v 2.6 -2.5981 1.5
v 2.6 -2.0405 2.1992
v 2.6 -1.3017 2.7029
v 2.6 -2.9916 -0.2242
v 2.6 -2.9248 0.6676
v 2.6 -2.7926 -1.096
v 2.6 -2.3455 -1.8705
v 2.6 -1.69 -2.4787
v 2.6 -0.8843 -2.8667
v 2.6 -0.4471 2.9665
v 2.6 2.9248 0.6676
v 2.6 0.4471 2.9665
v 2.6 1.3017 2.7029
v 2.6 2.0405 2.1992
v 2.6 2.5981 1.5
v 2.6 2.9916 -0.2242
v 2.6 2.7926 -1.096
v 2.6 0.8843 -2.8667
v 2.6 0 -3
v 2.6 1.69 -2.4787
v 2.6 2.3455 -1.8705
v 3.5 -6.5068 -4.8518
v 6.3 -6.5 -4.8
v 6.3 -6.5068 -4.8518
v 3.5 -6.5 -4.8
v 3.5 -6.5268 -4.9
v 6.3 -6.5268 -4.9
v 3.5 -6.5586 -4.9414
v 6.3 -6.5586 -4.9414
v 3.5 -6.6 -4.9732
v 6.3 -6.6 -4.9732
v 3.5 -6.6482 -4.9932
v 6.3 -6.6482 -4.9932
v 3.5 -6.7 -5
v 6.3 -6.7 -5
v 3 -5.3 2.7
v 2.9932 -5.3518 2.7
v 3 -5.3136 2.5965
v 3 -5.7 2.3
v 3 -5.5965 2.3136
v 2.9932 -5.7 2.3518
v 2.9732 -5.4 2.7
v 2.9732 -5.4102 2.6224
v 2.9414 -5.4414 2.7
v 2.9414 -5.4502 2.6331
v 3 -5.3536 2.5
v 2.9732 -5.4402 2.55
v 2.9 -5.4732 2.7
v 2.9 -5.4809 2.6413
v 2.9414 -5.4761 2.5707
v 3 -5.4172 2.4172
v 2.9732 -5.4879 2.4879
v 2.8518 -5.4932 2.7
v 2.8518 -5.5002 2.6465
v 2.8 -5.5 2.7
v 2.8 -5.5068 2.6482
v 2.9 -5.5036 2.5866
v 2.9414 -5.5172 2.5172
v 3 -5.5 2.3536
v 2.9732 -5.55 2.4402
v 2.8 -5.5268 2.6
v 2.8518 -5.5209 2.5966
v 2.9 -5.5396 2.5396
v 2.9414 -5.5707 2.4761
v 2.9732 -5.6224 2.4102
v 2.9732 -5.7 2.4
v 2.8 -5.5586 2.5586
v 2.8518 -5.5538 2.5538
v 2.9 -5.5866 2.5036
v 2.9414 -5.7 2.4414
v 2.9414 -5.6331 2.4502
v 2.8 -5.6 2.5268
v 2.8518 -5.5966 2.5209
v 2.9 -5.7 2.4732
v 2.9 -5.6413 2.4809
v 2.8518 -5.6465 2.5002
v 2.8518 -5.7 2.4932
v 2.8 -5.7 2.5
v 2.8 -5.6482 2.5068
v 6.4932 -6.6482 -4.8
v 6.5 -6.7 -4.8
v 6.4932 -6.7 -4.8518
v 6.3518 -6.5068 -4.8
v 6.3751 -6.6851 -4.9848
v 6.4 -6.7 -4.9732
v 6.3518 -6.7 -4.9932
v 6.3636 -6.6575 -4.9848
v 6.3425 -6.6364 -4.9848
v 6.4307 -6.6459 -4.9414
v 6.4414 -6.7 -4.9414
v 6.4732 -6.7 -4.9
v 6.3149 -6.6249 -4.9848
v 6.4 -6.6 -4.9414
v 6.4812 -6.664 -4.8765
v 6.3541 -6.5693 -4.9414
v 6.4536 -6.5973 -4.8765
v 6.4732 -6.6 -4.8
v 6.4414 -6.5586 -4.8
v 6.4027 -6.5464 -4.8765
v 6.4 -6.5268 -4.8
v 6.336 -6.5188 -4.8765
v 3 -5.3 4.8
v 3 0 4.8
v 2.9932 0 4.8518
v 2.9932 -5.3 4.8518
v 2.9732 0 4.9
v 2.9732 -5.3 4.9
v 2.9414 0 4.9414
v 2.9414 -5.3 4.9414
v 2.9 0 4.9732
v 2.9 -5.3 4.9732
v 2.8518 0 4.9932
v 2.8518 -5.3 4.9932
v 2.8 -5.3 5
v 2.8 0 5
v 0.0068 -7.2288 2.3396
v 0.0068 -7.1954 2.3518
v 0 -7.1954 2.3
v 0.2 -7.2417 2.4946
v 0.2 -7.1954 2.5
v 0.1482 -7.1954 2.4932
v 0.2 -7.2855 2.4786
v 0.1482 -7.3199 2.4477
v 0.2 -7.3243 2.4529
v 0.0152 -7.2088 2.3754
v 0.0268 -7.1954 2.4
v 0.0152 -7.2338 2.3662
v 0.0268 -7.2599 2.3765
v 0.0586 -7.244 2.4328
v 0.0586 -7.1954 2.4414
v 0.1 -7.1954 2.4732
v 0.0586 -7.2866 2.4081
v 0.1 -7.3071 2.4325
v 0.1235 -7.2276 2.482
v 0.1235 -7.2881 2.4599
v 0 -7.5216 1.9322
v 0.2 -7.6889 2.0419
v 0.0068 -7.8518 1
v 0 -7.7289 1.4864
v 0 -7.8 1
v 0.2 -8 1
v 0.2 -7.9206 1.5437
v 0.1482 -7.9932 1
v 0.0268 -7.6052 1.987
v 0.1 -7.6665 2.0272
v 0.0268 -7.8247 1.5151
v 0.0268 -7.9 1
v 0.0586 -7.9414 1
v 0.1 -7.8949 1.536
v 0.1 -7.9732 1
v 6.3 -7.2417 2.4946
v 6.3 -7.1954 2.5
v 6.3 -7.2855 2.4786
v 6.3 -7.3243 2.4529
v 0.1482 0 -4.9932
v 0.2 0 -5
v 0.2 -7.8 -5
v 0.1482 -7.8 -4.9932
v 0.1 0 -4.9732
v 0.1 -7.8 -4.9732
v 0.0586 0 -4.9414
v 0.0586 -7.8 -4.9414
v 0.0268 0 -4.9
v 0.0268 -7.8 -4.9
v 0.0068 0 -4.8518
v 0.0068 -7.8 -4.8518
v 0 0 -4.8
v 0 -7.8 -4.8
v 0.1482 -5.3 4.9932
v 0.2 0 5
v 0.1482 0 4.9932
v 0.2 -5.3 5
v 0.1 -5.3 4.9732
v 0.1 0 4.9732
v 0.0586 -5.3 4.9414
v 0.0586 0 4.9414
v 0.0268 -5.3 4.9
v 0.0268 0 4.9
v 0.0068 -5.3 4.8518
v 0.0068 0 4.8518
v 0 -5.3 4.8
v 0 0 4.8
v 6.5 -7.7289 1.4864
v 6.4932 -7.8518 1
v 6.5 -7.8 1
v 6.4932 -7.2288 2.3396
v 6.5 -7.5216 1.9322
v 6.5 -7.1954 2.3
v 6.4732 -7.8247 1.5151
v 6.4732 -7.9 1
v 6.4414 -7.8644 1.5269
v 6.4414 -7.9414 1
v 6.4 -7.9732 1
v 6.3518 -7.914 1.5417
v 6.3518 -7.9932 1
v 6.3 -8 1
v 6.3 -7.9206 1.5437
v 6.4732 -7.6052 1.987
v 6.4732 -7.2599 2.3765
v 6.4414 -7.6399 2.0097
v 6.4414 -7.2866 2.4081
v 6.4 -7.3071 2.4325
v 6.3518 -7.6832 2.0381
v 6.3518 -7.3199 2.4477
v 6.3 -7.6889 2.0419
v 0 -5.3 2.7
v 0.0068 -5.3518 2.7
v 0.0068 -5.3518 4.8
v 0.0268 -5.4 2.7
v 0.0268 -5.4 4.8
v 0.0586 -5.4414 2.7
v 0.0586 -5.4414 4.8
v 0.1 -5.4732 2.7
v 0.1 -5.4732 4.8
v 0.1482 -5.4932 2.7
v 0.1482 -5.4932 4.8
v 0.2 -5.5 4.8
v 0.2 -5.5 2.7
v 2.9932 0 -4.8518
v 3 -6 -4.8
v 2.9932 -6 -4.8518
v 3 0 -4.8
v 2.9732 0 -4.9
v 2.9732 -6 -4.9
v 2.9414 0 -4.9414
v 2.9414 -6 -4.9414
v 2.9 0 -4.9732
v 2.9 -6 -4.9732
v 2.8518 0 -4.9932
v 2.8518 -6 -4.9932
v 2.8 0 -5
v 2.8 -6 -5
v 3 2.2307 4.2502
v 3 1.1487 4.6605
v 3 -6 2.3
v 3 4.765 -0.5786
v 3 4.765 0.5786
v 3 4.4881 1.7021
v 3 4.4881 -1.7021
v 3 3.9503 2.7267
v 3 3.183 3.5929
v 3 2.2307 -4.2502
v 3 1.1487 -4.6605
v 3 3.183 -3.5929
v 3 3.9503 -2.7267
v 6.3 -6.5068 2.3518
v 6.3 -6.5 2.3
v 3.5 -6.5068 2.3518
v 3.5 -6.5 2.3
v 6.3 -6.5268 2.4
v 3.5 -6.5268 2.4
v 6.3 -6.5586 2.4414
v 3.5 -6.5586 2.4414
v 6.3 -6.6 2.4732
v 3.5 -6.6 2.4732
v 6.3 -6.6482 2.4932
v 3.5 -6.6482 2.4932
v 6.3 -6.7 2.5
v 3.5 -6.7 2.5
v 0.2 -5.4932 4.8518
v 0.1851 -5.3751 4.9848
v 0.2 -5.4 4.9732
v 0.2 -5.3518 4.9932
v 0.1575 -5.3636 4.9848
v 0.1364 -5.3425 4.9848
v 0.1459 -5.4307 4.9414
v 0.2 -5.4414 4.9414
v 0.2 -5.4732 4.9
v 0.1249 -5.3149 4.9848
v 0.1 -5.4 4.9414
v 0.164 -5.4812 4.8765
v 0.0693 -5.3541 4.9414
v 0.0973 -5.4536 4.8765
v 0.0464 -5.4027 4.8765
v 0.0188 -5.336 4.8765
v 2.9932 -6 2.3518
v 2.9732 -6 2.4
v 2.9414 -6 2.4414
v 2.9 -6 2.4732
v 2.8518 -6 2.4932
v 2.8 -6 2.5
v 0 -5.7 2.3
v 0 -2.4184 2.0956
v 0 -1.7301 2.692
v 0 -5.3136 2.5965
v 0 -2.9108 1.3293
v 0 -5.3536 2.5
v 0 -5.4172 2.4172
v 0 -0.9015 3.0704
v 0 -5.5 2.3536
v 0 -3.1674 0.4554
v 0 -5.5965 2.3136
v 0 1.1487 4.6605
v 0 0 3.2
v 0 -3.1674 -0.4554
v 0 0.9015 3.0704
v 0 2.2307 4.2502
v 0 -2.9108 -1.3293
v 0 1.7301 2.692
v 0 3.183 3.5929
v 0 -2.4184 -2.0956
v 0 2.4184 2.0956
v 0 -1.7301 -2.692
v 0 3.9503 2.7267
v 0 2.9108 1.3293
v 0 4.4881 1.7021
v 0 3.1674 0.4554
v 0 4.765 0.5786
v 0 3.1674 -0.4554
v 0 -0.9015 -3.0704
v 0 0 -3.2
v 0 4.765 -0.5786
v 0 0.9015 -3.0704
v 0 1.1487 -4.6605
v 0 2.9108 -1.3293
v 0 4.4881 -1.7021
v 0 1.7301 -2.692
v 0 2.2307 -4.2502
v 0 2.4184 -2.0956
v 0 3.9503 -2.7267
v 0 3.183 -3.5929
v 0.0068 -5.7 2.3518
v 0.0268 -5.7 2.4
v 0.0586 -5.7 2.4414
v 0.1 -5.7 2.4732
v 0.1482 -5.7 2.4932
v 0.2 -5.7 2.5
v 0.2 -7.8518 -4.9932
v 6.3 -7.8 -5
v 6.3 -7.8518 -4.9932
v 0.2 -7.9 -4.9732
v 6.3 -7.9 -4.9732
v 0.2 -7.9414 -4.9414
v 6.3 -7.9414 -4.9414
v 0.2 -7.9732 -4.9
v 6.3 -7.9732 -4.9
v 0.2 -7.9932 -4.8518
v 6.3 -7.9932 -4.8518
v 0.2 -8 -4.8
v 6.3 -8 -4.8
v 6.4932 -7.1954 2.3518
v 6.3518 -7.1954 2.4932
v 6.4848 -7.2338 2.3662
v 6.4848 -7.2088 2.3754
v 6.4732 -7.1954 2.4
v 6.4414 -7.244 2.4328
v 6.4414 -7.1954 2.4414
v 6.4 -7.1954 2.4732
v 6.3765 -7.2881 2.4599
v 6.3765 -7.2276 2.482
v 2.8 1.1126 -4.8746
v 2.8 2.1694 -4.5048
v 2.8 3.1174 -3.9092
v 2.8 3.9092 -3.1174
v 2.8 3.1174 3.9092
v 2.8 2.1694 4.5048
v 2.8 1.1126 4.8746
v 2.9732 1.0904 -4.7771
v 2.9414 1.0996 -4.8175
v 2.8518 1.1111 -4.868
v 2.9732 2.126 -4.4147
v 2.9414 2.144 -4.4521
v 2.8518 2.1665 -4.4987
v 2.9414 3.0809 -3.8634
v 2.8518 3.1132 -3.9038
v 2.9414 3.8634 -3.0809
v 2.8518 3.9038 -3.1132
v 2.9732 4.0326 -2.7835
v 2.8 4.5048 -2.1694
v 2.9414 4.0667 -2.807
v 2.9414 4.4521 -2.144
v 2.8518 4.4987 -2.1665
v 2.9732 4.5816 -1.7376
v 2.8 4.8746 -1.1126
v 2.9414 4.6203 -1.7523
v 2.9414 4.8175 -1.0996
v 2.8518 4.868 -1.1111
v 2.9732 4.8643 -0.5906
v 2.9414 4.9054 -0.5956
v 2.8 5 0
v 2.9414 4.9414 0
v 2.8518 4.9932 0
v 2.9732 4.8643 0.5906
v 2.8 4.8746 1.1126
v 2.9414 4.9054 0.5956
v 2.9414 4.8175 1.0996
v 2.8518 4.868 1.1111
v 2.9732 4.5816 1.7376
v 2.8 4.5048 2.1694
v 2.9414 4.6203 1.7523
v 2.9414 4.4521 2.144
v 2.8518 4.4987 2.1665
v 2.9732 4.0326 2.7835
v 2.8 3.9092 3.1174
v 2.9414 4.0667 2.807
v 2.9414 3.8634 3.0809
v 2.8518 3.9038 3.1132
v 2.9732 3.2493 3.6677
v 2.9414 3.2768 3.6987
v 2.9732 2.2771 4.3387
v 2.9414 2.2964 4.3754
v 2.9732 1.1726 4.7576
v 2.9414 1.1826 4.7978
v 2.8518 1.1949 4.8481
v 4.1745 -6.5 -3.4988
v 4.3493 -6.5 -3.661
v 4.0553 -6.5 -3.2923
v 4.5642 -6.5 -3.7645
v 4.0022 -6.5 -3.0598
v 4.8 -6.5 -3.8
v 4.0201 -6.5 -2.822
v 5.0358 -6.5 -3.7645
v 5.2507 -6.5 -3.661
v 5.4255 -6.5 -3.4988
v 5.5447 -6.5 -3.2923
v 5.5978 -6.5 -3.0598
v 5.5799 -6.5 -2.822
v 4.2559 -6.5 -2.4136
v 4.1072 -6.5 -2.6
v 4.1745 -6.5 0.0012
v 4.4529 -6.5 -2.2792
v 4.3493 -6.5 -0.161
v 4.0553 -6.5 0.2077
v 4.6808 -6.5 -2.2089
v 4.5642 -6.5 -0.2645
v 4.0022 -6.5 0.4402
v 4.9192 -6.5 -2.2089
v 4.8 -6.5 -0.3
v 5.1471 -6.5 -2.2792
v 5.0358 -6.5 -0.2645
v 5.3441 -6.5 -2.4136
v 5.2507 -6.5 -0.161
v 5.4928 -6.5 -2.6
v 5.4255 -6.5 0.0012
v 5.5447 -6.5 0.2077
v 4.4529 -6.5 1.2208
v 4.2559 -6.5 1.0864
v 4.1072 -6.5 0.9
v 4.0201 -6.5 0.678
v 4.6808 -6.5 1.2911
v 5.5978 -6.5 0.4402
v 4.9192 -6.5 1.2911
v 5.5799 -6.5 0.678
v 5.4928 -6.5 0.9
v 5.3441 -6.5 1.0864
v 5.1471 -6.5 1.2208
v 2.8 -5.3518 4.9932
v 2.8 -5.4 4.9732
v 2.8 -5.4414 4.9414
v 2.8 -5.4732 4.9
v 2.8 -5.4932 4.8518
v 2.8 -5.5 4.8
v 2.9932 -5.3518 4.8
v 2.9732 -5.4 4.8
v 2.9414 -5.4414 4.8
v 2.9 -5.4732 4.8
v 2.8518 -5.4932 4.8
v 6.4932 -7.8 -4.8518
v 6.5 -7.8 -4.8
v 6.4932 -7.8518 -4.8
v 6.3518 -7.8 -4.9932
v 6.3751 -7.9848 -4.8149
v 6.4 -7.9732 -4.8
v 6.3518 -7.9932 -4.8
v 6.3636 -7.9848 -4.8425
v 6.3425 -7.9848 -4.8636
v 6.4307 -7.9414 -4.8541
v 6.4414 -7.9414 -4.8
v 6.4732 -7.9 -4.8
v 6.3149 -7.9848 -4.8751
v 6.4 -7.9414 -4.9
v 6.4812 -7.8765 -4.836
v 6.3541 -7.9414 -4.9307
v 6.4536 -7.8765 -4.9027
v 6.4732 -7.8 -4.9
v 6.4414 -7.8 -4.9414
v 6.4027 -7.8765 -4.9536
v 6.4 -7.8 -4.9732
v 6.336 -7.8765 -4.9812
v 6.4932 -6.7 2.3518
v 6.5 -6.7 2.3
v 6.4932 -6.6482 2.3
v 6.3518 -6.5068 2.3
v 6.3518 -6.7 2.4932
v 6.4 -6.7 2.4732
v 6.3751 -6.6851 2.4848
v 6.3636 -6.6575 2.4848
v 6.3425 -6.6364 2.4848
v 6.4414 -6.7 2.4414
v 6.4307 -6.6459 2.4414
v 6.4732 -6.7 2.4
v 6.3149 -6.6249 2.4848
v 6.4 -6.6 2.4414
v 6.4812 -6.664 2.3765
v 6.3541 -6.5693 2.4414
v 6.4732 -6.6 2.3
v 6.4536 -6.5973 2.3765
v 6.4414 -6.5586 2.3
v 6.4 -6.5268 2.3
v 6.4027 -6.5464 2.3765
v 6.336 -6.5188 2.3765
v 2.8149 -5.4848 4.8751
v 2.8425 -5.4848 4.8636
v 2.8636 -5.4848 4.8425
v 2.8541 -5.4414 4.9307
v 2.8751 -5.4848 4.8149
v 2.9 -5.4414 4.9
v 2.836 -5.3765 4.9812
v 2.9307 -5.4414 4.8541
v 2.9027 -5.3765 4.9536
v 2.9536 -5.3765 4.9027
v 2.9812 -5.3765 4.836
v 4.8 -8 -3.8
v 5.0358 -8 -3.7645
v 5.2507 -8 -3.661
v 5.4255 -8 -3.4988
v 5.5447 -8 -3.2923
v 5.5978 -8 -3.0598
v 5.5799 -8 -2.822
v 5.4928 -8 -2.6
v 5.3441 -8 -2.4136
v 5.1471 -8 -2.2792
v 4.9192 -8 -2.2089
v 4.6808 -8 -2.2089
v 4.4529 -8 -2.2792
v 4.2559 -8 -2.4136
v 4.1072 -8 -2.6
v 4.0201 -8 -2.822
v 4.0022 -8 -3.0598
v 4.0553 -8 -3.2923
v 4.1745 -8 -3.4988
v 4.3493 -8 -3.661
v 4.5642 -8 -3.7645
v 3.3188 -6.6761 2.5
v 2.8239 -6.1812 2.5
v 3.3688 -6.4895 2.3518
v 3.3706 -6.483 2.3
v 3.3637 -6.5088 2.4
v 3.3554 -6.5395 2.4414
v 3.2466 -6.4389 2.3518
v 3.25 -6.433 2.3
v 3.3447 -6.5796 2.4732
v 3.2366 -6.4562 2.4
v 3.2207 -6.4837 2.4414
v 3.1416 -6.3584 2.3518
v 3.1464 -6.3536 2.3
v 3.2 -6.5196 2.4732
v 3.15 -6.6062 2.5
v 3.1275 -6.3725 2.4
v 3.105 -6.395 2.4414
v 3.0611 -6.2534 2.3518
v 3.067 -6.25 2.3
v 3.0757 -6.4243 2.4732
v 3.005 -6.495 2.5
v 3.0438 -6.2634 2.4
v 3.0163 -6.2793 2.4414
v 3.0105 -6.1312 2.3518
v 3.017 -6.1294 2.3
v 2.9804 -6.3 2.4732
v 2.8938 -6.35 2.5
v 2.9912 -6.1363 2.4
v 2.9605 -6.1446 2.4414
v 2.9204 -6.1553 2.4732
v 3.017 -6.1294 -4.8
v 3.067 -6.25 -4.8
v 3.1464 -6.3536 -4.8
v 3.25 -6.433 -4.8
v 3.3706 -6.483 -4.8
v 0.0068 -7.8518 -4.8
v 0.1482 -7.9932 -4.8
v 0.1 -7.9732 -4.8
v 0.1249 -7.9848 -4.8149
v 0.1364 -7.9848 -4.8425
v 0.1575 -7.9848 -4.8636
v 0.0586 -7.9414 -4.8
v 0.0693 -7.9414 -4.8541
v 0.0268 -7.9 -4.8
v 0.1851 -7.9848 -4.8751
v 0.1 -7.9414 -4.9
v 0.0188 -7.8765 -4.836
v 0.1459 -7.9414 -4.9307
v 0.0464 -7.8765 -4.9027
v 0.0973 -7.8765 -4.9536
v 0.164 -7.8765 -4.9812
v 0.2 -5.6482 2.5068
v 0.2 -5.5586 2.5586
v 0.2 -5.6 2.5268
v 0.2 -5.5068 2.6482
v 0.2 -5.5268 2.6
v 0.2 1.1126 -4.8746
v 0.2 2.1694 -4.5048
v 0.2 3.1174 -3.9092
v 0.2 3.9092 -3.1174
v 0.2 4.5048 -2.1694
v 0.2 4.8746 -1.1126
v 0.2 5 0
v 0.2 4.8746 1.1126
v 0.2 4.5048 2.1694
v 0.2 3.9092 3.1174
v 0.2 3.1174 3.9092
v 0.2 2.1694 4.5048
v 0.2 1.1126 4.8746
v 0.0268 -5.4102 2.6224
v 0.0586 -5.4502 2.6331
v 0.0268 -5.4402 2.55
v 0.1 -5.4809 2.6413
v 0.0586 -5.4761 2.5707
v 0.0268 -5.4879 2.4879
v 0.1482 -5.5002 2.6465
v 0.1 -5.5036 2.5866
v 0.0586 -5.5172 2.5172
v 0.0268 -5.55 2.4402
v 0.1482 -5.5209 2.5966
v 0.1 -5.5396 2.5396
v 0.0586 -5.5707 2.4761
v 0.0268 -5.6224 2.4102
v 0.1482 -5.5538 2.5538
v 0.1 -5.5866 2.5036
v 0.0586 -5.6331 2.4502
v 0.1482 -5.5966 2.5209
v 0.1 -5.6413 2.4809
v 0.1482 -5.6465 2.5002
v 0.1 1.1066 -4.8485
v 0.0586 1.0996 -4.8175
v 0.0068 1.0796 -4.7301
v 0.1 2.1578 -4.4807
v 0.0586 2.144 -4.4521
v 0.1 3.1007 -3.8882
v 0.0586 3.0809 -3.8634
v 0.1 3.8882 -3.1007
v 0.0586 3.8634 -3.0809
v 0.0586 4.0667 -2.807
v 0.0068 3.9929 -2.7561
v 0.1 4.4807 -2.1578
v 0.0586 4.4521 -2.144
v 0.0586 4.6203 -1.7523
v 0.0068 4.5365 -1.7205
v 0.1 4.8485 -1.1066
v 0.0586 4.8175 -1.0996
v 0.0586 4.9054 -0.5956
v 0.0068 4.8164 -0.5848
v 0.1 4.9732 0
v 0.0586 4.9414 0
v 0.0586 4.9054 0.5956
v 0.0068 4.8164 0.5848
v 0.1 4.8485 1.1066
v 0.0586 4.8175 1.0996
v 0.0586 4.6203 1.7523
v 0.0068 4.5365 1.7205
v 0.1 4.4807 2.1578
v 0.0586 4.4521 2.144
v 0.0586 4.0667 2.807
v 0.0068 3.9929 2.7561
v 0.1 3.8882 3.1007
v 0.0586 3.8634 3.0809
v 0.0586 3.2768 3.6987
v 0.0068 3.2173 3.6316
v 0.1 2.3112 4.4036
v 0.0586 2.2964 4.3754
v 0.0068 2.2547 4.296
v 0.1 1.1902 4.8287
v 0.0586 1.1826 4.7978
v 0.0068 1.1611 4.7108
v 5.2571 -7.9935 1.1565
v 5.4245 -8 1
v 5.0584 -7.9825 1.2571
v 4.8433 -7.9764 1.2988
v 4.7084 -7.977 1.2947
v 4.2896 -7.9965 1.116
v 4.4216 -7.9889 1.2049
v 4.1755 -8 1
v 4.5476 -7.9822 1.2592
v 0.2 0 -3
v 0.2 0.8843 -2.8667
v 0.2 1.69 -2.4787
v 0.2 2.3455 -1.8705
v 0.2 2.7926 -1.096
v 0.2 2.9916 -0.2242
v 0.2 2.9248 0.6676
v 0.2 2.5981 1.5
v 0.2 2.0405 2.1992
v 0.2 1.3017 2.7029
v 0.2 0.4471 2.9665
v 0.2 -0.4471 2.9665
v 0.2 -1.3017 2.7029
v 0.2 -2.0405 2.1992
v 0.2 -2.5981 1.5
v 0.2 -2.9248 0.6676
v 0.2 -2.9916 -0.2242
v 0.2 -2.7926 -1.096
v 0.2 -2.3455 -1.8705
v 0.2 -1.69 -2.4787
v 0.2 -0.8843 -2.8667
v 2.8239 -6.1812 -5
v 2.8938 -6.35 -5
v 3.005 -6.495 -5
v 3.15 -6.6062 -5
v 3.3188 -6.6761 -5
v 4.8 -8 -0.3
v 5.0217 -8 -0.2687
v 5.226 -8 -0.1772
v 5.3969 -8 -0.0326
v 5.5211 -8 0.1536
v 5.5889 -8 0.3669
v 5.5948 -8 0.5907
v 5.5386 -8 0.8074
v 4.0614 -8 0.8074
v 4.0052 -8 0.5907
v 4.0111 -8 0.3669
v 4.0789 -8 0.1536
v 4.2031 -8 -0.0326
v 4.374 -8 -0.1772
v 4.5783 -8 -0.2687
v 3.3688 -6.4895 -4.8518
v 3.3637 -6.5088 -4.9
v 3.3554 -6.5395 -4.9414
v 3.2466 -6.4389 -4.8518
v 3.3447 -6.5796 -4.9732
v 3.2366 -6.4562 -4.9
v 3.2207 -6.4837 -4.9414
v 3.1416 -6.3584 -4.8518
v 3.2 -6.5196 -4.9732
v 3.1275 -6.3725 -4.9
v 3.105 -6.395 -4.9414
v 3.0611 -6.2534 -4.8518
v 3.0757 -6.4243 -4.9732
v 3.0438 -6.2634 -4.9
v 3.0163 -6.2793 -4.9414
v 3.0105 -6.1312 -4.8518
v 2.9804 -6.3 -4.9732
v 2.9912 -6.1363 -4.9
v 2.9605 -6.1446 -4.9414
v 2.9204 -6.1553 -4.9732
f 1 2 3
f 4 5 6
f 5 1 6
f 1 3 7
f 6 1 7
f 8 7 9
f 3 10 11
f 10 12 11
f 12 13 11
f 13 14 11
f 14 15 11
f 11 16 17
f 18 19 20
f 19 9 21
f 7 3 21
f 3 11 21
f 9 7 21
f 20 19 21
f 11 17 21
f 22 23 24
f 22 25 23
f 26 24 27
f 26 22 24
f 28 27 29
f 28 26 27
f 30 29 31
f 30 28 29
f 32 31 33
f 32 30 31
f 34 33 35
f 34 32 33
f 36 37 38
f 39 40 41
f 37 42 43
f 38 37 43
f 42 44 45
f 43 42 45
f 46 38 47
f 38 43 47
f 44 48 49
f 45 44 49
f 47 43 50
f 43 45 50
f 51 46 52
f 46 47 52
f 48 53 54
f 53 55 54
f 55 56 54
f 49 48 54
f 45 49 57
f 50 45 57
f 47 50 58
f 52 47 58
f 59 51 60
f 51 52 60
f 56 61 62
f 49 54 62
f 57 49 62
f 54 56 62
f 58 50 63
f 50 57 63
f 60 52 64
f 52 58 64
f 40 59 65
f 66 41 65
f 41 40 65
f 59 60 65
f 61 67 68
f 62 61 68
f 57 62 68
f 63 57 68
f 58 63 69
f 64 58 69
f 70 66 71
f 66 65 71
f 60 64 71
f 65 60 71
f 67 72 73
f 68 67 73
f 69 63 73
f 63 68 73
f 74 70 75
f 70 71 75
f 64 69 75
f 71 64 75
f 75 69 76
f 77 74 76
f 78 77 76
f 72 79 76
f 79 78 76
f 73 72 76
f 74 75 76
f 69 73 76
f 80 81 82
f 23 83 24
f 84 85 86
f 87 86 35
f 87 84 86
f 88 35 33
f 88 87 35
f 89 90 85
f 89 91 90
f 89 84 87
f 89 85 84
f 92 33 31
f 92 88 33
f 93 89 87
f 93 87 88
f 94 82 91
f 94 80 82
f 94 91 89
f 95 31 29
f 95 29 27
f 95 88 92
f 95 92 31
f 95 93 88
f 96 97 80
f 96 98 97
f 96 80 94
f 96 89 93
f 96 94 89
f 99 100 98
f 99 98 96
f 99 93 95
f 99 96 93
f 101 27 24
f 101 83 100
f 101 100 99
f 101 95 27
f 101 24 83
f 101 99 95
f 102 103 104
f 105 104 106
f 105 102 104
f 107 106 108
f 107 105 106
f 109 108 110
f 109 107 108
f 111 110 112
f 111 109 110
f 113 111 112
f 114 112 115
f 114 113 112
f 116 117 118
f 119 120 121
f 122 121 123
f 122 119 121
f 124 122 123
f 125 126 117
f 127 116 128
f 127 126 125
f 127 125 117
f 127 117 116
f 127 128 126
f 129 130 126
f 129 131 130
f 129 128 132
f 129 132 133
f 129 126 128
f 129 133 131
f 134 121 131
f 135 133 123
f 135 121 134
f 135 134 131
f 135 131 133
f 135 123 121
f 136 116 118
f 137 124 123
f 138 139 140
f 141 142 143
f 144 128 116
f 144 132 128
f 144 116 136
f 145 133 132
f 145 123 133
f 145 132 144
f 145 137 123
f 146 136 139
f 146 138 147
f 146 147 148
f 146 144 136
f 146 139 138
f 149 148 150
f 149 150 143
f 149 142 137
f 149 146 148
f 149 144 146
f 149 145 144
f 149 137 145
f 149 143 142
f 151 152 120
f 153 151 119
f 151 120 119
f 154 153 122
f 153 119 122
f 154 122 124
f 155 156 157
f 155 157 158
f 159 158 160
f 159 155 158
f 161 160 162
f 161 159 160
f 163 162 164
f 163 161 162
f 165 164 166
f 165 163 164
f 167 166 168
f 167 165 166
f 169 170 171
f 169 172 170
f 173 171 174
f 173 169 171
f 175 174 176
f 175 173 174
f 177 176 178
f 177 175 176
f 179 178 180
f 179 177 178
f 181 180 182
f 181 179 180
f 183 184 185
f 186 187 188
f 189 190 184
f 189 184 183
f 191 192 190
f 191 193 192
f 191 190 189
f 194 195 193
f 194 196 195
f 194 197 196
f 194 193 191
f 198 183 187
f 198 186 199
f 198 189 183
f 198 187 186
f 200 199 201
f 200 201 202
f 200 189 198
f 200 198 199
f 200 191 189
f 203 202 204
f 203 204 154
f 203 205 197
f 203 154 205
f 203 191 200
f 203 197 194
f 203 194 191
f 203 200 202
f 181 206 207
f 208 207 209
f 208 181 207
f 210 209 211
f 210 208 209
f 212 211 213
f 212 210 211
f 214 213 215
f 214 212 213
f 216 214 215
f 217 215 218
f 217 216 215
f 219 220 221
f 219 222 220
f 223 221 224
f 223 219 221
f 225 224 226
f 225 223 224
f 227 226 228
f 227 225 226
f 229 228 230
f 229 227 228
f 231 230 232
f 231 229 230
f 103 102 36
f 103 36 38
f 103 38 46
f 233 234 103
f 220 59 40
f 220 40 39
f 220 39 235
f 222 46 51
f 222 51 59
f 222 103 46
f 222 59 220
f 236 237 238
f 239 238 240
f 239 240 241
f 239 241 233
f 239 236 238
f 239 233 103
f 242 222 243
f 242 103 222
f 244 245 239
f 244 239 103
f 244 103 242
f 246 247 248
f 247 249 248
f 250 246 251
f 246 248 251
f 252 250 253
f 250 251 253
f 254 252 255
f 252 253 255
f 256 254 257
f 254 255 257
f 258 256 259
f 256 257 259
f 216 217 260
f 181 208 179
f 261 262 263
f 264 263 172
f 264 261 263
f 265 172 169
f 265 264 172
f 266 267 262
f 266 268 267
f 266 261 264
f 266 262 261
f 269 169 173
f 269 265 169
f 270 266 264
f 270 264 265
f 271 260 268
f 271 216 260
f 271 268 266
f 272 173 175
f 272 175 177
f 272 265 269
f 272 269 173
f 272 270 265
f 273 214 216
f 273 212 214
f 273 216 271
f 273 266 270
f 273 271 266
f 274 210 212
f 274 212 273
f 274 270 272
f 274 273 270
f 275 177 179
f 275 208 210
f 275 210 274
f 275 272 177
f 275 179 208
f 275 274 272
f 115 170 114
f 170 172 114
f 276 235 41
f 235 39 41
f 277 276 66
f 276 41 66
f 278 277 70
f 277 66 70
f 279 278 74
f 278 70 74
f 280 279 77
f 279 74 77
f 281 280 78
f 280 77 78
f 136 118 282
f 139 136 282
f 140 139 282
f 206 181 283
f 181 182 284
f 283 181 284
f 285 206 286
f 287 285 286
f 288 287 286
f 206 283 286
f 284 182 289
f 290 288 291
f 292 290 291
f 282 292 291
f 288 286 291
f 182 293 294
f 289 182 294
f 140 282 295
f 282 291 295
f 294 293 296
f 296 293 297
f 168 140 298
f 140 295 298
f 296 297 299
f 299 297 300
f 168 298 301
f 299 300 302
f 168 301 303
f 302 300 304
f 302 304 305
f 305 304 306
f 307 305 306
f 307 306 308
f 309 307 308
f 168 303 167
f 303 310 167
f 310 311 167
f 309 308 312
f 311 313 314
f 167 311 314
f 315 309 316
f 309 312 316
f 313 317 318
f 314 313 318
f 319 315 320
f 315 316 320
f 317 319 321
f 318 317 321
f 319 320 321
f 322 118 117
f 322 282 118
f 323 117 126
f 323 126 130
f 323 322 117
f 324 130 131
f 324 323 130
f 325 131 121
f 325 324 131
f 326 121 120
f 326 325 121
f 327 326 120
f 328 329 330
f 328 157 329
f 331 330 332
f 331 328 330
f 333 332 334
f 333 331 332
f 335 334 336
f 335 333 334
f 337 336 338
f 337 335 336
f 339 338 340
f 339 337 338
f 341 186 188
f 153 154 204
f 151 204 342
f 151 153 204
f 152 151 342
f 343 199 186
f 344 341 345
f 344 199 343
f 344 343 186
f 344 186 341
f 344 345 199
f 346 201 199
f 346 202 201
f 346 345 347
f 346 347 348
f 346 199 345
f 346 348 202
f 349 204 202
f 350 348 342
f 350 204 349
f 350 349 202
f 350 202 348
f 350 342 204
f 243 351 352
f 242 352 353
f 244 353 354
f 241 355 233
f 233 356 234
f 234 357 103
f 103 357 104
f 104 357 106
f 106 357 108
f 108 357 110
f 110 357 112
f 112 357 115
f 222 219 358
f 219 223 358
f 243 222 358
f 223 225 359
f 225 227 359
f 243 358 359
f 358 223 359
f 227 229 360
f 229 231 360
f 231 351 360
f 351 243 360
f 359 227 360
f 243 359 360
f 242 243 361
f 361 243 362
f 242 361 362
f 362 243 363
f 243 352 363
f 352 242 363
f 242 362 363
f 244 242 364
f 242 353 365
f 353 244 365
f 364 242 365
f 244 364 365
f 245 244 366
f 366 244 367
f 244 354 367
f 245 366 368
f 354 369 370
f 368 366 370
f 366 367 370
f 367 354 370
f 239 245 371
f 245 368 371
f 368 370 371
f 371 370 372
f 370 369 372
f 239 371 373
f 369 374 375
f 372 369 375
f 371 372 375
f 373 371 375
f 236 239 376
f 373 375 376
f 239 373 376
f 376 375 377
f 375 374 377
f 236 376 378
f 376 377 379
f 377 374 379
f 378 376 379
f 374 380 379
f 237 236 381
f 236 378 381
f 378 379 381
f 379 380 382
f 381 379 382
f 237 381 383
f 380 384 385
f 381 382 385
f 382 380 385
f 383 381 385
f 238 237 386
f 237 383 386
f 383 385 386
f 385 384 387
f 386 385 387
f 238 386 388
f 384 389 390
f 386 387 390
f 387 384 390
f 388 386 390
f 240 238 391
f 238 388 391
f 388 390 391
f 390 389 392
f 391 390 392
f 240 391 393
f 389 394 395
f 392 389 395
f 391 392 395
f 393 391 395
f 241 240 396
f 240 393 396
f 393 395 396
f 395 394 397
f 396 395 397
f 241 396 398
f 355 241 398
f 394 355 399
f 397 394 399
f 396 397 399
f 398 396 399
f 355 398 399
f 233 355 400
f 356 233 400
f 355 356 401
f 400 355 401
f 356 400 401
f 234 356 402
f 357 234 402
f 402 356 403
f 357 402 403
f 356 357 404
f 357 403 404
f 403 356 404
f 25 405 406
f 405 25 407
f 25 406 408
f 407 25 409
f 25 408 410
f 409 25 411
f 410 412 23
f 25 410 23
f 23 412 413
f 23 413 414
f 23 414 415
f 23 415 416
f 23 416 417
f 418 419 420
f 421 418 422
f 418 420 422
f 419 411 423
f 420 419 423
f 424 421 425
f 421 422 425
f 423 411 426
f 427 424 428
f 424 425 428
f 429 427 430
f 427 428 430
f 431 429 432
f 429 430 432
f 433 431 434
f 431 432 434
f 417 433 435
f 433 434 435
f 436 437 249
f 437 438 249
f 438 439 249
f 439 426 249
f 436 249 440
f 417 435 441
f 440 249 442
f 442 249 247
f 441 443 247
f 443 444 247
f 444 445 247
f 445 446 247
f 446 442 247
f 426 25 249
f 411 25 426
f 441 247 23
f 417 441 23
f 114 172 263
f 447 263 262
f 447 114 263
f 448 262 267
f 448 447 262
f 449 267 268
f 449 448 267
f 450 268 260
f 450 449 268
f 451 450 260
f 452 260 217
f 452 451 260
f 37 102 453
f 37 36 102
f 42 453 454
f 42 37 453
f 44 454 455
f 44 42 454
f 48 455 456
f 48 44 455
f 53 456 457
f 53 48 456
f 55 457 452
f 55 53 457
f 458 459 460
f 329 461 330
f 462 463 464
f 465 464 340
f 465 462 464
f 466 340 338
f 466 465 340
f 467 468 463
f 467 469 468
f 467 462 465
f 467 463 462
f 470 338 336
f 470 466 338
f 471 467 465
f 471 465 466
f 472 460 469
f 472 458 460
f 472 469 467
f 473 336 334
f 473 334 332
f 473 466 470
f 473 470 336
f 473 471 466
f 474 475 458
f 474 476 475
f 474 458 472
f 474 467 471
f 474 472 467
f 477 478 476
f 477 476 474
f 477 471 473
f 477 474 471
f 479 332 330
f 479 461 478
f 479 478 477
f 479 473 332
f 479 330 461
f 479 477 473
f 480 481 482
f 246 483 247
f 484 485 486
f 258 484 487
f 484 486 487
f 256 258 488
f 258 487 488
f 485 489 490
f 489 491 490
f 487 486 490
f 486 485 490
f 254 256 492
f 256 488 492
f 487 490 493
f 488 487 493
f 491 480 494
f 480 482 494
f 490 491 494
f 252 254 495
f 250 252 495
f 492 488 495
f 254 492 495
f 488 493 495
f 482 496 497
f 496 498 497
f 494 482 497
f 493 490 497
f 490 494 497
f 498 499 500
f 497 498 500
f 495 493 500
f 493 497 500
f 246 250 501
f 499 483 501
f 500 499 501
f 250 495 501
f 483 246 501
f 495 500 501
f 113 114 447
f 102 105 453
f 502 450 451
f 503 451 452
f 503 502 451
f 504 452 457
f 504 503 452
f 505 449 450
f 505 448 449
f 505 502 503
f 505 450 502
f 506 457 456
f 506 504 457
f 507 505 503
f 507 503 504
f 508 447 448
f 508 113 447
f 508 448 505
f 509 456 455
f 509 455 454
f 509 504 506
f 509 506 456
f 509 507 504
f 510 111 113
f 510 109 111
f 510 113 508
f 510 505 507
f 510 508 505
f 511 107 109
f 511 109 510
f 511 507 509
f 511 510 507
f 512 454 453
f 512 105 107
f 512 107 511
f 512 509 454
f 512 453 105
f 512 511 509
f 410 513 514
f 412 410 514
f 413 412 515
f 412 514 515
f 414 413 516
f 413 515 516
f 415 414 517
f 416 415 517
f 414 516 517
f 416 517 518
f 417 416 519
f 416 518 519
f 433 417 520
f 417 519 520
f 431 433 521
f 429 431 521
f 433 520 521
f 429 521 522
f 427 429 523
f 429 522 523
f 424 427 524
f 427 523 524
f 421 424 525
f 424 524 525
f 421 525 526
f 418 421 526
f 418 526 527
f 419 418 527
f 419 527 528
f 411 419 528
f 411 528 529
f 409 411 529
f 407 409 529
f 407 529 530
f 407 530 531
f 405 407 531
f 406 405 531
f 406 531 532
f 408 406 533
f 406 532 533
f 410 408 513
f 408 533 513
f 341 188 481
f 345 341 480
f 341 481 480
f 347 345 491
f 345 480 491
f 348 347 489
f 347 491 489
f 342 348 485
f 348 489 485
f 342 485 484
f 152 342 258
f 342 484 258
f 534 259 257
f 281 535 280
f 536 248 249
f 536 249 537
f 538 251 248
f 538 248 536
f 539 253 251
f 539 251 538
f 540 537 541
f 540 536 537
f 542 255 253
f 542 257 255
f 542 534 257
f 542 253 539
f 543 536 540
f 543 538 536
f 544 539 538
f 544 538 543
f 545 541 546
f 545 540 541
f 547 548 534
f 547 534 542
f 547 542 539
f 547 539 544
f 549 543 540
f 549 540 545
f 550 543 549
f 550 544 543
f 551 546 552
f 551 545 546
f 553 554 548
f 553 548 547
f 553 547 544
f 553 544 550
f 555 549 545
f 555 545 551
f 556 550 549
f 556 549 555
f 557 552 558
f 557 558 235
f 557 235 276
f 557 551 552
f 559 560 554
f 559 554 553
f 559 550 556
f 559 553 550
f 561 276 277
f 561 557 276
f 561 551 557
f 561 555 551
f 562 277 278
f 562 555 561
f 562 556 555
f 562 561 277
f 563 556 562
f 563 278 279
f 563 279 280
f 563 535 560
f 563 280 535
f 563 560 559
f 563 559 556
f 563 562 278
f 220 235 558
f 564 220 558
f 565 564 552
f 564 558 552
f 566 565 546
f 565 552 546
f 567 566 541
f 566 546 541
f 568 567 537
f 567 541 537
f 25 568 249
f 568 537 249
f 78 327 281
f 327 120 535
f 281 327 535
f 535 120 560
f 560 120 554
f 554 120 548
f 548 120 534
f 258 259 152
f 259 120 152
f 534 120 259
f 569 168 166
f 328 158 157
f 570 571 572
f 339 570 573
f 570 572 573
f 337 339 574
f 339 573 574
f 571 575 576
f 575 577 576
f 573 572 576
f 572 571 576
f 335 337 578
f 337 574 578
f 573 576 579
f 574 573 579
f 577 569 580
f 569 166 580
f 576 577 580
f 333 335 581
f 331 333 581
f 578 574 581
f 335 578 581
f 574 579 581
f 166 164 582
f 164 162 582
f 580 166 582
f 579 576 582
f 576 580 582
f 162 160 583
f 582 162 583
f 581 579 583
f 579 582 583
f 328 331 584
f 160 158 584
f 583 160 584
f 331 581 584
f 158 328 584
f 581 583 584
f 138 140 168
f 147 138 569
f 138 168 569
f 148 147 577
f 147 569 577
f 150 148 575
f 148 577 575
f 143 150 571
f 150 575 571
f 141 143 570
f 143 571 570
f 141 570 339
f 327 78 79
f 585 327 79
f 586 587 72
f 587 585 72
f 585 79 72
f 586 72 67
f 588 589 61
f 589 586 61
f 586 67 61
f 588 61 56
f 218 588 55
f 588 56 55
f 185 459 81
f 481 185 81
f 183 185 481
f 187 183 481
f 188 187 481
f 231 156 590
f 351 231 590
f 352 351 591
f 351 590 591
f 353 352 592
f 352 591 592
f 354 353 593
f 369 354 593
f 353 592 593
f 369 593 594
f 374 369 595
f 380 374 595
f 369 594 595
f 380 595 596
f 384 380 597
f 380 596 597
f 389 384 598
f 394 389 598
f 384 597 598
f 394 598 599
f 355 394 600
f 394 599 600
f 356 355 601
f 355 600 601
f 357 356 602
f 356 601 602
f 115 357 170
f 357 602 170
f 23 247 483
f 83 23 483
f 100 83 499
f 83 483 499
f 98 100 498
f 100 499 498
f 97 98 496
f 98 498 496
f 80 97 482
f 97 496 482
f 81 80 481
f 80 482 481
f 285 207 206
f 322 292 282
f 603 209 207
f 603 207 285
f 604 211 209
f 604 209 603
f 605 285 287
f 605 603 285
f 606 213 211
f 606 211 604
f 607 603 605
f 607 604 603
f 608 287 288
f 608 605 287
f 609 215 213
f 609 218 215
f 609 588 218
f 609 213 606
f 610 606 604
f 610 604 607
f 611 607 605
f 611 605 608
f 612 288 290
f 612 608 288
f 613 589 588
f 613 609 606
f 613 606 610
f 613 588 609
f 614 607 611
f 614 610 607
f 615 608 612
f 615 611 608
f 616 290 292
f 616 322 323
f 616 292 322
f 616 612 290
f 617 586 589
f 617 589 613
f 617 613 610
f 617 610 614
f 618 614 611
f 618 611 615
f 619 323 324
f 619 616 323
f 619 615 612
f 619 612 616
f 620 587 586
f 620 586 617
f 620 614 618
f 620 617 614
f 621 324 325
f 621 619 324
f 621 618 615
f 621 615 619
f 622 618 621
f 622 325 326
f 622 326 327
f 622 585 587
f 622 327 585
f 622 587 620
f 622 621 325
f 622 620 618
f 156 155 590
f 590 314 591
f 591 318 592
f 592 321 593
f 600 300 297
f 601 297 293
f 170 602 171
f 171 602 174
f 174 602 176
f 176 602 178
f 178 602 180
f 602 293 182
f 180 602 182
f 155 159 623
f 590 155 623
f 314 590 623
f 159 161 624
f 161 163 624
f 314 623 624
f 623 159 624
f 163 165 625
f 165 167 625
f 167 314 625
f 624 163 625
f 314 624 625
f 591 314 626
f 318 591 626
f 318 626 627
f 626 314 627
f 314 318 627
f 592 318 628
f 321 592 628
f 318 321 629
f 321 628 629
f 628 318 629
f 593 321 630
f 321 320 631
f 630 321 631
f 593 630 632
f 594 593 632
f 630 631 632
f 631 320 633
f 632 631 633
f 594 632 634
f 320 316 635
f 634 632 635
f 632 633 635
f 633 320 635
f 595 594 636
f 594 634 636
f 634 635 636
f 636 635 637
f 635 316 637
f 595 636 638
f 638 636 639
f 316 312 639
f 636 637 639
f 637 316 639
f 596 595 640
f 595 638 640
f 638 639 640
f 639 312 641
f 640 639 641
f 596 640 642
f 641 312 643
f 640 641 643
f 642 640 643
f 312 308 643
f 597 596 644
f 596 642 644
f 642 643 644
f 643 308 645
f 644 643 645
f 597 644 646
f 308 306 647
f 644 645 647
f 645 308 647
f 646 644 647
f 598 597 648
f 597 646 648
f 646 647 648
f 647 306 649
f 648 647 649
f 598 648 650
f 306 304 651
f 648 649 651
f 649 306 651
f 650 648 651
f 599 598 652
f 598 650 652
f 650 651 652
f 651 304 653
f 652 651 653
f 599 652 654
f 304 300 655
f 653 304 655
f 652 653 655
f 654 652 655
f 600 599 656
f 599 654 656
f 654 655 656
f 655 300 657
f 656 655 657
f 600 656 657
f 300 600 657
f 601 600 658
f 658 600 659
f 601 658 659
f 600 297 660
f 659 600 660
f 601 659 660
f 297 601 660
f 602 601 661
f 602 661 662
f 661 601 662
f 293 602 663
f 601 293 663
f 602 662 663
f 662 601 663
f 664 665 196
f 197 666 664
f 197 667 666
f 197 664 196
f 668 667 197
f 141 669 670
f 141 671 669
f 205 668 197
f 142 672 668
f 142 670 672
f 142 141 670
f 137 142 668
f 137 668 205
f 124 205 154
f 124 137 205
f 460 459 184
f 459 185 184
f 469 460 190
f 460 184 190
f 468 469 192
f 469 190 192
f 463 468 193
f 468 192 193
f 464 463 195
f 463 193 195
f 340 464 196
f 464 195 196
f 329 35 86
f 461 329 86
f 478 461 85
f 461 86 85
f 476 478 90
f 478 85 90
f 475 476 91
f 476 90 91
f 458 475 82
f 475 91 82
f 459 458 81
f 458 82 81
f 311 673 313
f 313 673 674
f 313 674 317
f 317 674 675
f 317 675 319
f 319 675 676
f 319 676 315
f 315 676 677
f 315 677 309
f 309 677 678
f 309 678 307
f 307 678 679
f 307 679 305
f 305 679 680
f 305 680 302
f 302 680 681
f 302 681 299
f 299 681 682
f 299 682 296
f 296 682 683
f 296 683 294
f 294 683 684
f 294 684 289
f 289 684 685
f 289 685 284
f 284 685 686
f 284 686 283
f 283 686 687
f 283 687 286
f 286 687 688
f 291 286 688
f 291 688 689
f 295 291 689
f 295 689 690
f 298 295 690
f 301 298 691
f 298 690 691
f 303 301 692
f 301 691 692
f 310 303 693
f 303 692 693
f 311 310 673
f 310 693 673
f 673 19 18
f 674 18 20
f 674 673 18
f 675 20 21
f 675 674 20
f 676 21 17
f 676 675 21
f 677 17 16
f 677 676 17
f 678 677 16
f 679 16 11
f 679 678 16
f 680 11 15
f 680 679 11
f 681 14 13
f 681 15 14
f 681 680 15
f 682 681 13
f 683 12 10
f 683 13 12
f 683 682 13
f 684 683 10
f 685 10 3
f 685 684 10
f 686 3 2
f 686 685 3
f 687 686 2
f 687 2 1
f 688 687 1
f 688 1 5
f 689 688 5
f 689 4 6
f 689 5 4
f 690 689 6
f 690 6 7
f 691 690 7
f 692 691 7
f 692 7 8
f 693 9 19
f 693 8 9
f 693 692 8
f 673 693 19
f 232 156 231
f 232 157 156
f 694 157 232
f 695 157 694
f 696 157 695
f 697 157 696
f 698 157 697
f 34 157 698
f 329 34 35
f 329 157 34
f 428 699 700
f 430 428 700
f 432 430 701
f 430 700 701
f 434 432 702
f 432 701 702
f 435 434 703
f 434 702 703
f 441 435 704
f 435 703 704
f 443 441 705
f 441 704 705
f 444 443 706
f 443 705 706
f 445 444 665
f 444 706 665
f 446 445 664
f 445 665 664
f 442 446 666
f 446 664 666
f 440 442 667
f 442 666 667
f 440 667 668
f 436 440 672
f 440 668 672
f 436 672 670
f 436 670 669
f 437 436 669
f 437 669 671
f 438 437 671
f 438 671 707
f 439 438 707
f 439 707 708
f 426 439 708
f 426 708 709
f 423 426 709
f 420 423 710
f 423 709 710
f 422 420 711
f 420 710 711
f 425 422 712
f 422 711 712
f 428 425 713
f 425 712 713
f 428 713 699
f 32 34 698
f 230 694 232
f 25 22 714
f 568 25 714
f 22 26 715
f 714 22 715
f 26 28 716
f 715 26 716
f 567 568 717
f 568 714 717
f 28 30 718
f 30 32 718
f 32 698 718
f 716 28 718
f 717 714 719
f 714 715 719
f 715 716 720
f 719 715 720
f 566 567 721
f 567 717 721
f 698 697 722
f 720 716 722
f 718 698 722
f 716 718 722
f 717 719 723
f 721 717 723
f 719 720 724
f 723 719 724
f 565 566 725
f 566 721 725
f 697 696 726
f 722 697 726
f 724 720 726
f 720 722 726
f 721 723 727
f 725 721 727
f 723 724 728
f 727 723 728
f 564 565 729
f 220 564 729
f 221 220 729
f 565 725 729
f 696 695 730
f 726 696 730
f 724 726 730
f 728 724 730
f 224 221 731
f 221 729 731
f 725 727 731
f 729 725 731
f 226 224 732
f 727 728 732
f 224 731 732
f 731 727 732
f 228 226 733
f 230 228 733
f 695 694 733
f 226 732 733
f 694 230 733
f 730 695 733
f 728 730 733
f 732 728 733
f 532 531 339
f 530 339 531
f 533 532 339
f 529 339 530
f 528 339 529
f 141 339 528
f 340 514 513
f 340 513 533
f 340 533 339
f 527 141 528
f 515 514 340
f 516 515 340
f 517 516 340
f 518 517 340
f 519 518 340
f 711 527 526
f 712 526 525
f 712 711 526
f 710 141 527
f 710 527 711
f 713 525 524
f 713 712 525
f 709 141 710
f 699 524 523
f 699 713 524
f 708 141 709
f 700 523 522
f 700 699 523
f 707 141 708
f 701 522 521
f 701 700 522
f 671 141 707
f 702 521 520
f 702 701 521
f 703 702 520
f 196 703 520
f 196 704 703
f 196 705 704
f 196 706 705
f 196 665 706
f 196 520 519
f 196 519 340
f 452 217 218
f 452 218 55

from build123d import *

# Parameters (mm, degrees)
SKETCH_1_R          = 3
EXTRUDE_1_DEPTH     = 3
SKETCH_2_W          = 3.5
SKETCH_2_H          = 10
SKETCH_2_R          = 0.8
EXTRUDE_2_DEPTH     = 1.5
SKETCH_5_W          = 6.5
SKETCH_5_H          = 2.5
CUT_EXTRUDE_1_DEPTH = 2.5
CUT_EXTRUDE_2_REACH = 13.456
FILLET_1_R          = 0.5
FILLET_2_R          = 0.2
CHAMFER_1_SIZE      = 0.2
SKETCH_3_R          = 3.977941141
EXTRUDE_3_DEPTH     = 0.4


with BuildPart() as part:
    # 草图1 → 凸台-拉伸1 (new body)
    with BuildSketch(Plane(origin=(0, 0, 0), x_dir=(0, 0, -1), z_dir=(1, 0, 0))):
        with BuildLine():
            Line((-5, 0), (-5, -8))
            Line((-5, -8), (5, -8))
            Line((5, -8), (5, 0))
            ThreePointArc((5, 0), (0, 5), (-5, 0))
        make_face()
        Circle(SKETCH_1_R, mode=Mode.SUBTRACT)
    extrude(amount=EXTRUDE_1_DEPTH)

    # 草图2 → 凸台-拉伸2 (add)
    with BuildSketch(Plane.XZ.offset(8)):
        with Locations((4.75, 0)):
            Rectangle(SKETCH_2_W, SKETCH_2_H)
        with Locations(Location((4.8, -3, 0), (0, 0, 270))):
            Circle(SKETCH_2_R, mode=Mode.SUBTRACT)
        with Locations(Location((4.8, 0.5, 0), (0, 0, 270))):
            Circle(SKETCH_2_R, mode=Mode.SUBTRACT)
    extrude(amount=-EXTRUDE_2_DEPTH)

    # 草图5 → 切除-拉伸1 (cut)
    with BuildSketch(Plane.XZ.offset(8)):
        with Locations((3.25, 3.75)):
            Rectangle(SKETCH_5_W, SKETCH_5_H)
    extrude(amount=-CUT_EXTRUDE_1_DEPTH, mode=Mode.SUBTRACT)

    # 草图6 → 切除-拉伸2 (cut, up to next)
    with BuildSketch(Plane.ZY, mode=Mode.PRIVATE) as cut_extrude_2_sk1:
        with BuildLine():
            Line((2.897366596, -6), (3.27705392, -6))
            Line((3.27705392, -6), (3.27705392, -8.325127743))
            Line((3.27705392, -8.325127743), (1, -8.325127743))
            Line((1, -8.325127743), (1, -8))
            ThreePointArc((1, -8), (2.378404875, -7.407669683), (2.897366596, -6))
        make_face()
    cut_extrude_2_tool1 = extrude(cut_extrude_2_sk1.sketch, amount=-CUT_EXTRUDE_2_REACH, mode=Mode.PRIVATE) & part.part
    add(cut_extrude_2_tool1.solids().sort_by_distance((0, -7.575754, 2.569334))[0], mode=Mode.SUBTRACT)

    # 圆角1
    fillet_1_edges = [part.edges().sort_by_distance(p)[0] for p in [
        (3, -6.5, -1.25),
    ]]
    fillet(fillet_1_edges, radius=FILLET_1_R)

    # 圆角2
    fillet_2_edges = [part.edges().sort_by_distance(p)[0] for p in [
        (6.5, -6.5, -1.25),
        (6.5, -7.25, -5),
        (6.5, -8, -2),
        (3, 5, 0),
        (0, -5.5, 3.75),
        (0, -6.383095189, 2.5),
        (1.5, -5.5, 5),
        (6.5, -6.883095189, 2.5),
        (1.5, -5.5, 2.5),
        (3, -5.5, 3.75),
        (0, -4, -5),
        (0, -2.75, 5),
        (0, 5, 0),
        (0, -8, -2),
        (3.25, -7.266190379, 2.5),
        (6.5, -7.806716397, 1.834936608),
        (0, -7.806716397, 1.834936608),
        (3, -5.75, 2.5),
        (3, -3, -5),
        (5, -6.5, 2.5),
        (3, -2.75, 5),
        (5, -6.5, -5),
        (3.146446609, -6.353553391, -5),
        (3.146446609, -6.353553391, 2.5),
        (3.25, -8, -5),
    ]]
    fillet(fillet_2_edges, radius=FILLET_2_R)

    # 倒角1
    chamfer_1_edges = [part.edges().sort_by_distance(p)[0] for p in [
        (0, 0, 3),
        (3, 0, 3),
    ]]
    chamfer(chamfer_1_edges, length=CHAMFER_1_SIZE)

    # 草图3 → 凸台-拉伸3 (add)
    with BuildSketch(Plane(origin=(3, 0, 0), x_dir=(0, 0, -1), z_dir=(1, 0, 0))):
        Circle(SKETCH_3_R)
    extrude(amount=-EXTRUDE_3_DEPTH)


solid = part.part
